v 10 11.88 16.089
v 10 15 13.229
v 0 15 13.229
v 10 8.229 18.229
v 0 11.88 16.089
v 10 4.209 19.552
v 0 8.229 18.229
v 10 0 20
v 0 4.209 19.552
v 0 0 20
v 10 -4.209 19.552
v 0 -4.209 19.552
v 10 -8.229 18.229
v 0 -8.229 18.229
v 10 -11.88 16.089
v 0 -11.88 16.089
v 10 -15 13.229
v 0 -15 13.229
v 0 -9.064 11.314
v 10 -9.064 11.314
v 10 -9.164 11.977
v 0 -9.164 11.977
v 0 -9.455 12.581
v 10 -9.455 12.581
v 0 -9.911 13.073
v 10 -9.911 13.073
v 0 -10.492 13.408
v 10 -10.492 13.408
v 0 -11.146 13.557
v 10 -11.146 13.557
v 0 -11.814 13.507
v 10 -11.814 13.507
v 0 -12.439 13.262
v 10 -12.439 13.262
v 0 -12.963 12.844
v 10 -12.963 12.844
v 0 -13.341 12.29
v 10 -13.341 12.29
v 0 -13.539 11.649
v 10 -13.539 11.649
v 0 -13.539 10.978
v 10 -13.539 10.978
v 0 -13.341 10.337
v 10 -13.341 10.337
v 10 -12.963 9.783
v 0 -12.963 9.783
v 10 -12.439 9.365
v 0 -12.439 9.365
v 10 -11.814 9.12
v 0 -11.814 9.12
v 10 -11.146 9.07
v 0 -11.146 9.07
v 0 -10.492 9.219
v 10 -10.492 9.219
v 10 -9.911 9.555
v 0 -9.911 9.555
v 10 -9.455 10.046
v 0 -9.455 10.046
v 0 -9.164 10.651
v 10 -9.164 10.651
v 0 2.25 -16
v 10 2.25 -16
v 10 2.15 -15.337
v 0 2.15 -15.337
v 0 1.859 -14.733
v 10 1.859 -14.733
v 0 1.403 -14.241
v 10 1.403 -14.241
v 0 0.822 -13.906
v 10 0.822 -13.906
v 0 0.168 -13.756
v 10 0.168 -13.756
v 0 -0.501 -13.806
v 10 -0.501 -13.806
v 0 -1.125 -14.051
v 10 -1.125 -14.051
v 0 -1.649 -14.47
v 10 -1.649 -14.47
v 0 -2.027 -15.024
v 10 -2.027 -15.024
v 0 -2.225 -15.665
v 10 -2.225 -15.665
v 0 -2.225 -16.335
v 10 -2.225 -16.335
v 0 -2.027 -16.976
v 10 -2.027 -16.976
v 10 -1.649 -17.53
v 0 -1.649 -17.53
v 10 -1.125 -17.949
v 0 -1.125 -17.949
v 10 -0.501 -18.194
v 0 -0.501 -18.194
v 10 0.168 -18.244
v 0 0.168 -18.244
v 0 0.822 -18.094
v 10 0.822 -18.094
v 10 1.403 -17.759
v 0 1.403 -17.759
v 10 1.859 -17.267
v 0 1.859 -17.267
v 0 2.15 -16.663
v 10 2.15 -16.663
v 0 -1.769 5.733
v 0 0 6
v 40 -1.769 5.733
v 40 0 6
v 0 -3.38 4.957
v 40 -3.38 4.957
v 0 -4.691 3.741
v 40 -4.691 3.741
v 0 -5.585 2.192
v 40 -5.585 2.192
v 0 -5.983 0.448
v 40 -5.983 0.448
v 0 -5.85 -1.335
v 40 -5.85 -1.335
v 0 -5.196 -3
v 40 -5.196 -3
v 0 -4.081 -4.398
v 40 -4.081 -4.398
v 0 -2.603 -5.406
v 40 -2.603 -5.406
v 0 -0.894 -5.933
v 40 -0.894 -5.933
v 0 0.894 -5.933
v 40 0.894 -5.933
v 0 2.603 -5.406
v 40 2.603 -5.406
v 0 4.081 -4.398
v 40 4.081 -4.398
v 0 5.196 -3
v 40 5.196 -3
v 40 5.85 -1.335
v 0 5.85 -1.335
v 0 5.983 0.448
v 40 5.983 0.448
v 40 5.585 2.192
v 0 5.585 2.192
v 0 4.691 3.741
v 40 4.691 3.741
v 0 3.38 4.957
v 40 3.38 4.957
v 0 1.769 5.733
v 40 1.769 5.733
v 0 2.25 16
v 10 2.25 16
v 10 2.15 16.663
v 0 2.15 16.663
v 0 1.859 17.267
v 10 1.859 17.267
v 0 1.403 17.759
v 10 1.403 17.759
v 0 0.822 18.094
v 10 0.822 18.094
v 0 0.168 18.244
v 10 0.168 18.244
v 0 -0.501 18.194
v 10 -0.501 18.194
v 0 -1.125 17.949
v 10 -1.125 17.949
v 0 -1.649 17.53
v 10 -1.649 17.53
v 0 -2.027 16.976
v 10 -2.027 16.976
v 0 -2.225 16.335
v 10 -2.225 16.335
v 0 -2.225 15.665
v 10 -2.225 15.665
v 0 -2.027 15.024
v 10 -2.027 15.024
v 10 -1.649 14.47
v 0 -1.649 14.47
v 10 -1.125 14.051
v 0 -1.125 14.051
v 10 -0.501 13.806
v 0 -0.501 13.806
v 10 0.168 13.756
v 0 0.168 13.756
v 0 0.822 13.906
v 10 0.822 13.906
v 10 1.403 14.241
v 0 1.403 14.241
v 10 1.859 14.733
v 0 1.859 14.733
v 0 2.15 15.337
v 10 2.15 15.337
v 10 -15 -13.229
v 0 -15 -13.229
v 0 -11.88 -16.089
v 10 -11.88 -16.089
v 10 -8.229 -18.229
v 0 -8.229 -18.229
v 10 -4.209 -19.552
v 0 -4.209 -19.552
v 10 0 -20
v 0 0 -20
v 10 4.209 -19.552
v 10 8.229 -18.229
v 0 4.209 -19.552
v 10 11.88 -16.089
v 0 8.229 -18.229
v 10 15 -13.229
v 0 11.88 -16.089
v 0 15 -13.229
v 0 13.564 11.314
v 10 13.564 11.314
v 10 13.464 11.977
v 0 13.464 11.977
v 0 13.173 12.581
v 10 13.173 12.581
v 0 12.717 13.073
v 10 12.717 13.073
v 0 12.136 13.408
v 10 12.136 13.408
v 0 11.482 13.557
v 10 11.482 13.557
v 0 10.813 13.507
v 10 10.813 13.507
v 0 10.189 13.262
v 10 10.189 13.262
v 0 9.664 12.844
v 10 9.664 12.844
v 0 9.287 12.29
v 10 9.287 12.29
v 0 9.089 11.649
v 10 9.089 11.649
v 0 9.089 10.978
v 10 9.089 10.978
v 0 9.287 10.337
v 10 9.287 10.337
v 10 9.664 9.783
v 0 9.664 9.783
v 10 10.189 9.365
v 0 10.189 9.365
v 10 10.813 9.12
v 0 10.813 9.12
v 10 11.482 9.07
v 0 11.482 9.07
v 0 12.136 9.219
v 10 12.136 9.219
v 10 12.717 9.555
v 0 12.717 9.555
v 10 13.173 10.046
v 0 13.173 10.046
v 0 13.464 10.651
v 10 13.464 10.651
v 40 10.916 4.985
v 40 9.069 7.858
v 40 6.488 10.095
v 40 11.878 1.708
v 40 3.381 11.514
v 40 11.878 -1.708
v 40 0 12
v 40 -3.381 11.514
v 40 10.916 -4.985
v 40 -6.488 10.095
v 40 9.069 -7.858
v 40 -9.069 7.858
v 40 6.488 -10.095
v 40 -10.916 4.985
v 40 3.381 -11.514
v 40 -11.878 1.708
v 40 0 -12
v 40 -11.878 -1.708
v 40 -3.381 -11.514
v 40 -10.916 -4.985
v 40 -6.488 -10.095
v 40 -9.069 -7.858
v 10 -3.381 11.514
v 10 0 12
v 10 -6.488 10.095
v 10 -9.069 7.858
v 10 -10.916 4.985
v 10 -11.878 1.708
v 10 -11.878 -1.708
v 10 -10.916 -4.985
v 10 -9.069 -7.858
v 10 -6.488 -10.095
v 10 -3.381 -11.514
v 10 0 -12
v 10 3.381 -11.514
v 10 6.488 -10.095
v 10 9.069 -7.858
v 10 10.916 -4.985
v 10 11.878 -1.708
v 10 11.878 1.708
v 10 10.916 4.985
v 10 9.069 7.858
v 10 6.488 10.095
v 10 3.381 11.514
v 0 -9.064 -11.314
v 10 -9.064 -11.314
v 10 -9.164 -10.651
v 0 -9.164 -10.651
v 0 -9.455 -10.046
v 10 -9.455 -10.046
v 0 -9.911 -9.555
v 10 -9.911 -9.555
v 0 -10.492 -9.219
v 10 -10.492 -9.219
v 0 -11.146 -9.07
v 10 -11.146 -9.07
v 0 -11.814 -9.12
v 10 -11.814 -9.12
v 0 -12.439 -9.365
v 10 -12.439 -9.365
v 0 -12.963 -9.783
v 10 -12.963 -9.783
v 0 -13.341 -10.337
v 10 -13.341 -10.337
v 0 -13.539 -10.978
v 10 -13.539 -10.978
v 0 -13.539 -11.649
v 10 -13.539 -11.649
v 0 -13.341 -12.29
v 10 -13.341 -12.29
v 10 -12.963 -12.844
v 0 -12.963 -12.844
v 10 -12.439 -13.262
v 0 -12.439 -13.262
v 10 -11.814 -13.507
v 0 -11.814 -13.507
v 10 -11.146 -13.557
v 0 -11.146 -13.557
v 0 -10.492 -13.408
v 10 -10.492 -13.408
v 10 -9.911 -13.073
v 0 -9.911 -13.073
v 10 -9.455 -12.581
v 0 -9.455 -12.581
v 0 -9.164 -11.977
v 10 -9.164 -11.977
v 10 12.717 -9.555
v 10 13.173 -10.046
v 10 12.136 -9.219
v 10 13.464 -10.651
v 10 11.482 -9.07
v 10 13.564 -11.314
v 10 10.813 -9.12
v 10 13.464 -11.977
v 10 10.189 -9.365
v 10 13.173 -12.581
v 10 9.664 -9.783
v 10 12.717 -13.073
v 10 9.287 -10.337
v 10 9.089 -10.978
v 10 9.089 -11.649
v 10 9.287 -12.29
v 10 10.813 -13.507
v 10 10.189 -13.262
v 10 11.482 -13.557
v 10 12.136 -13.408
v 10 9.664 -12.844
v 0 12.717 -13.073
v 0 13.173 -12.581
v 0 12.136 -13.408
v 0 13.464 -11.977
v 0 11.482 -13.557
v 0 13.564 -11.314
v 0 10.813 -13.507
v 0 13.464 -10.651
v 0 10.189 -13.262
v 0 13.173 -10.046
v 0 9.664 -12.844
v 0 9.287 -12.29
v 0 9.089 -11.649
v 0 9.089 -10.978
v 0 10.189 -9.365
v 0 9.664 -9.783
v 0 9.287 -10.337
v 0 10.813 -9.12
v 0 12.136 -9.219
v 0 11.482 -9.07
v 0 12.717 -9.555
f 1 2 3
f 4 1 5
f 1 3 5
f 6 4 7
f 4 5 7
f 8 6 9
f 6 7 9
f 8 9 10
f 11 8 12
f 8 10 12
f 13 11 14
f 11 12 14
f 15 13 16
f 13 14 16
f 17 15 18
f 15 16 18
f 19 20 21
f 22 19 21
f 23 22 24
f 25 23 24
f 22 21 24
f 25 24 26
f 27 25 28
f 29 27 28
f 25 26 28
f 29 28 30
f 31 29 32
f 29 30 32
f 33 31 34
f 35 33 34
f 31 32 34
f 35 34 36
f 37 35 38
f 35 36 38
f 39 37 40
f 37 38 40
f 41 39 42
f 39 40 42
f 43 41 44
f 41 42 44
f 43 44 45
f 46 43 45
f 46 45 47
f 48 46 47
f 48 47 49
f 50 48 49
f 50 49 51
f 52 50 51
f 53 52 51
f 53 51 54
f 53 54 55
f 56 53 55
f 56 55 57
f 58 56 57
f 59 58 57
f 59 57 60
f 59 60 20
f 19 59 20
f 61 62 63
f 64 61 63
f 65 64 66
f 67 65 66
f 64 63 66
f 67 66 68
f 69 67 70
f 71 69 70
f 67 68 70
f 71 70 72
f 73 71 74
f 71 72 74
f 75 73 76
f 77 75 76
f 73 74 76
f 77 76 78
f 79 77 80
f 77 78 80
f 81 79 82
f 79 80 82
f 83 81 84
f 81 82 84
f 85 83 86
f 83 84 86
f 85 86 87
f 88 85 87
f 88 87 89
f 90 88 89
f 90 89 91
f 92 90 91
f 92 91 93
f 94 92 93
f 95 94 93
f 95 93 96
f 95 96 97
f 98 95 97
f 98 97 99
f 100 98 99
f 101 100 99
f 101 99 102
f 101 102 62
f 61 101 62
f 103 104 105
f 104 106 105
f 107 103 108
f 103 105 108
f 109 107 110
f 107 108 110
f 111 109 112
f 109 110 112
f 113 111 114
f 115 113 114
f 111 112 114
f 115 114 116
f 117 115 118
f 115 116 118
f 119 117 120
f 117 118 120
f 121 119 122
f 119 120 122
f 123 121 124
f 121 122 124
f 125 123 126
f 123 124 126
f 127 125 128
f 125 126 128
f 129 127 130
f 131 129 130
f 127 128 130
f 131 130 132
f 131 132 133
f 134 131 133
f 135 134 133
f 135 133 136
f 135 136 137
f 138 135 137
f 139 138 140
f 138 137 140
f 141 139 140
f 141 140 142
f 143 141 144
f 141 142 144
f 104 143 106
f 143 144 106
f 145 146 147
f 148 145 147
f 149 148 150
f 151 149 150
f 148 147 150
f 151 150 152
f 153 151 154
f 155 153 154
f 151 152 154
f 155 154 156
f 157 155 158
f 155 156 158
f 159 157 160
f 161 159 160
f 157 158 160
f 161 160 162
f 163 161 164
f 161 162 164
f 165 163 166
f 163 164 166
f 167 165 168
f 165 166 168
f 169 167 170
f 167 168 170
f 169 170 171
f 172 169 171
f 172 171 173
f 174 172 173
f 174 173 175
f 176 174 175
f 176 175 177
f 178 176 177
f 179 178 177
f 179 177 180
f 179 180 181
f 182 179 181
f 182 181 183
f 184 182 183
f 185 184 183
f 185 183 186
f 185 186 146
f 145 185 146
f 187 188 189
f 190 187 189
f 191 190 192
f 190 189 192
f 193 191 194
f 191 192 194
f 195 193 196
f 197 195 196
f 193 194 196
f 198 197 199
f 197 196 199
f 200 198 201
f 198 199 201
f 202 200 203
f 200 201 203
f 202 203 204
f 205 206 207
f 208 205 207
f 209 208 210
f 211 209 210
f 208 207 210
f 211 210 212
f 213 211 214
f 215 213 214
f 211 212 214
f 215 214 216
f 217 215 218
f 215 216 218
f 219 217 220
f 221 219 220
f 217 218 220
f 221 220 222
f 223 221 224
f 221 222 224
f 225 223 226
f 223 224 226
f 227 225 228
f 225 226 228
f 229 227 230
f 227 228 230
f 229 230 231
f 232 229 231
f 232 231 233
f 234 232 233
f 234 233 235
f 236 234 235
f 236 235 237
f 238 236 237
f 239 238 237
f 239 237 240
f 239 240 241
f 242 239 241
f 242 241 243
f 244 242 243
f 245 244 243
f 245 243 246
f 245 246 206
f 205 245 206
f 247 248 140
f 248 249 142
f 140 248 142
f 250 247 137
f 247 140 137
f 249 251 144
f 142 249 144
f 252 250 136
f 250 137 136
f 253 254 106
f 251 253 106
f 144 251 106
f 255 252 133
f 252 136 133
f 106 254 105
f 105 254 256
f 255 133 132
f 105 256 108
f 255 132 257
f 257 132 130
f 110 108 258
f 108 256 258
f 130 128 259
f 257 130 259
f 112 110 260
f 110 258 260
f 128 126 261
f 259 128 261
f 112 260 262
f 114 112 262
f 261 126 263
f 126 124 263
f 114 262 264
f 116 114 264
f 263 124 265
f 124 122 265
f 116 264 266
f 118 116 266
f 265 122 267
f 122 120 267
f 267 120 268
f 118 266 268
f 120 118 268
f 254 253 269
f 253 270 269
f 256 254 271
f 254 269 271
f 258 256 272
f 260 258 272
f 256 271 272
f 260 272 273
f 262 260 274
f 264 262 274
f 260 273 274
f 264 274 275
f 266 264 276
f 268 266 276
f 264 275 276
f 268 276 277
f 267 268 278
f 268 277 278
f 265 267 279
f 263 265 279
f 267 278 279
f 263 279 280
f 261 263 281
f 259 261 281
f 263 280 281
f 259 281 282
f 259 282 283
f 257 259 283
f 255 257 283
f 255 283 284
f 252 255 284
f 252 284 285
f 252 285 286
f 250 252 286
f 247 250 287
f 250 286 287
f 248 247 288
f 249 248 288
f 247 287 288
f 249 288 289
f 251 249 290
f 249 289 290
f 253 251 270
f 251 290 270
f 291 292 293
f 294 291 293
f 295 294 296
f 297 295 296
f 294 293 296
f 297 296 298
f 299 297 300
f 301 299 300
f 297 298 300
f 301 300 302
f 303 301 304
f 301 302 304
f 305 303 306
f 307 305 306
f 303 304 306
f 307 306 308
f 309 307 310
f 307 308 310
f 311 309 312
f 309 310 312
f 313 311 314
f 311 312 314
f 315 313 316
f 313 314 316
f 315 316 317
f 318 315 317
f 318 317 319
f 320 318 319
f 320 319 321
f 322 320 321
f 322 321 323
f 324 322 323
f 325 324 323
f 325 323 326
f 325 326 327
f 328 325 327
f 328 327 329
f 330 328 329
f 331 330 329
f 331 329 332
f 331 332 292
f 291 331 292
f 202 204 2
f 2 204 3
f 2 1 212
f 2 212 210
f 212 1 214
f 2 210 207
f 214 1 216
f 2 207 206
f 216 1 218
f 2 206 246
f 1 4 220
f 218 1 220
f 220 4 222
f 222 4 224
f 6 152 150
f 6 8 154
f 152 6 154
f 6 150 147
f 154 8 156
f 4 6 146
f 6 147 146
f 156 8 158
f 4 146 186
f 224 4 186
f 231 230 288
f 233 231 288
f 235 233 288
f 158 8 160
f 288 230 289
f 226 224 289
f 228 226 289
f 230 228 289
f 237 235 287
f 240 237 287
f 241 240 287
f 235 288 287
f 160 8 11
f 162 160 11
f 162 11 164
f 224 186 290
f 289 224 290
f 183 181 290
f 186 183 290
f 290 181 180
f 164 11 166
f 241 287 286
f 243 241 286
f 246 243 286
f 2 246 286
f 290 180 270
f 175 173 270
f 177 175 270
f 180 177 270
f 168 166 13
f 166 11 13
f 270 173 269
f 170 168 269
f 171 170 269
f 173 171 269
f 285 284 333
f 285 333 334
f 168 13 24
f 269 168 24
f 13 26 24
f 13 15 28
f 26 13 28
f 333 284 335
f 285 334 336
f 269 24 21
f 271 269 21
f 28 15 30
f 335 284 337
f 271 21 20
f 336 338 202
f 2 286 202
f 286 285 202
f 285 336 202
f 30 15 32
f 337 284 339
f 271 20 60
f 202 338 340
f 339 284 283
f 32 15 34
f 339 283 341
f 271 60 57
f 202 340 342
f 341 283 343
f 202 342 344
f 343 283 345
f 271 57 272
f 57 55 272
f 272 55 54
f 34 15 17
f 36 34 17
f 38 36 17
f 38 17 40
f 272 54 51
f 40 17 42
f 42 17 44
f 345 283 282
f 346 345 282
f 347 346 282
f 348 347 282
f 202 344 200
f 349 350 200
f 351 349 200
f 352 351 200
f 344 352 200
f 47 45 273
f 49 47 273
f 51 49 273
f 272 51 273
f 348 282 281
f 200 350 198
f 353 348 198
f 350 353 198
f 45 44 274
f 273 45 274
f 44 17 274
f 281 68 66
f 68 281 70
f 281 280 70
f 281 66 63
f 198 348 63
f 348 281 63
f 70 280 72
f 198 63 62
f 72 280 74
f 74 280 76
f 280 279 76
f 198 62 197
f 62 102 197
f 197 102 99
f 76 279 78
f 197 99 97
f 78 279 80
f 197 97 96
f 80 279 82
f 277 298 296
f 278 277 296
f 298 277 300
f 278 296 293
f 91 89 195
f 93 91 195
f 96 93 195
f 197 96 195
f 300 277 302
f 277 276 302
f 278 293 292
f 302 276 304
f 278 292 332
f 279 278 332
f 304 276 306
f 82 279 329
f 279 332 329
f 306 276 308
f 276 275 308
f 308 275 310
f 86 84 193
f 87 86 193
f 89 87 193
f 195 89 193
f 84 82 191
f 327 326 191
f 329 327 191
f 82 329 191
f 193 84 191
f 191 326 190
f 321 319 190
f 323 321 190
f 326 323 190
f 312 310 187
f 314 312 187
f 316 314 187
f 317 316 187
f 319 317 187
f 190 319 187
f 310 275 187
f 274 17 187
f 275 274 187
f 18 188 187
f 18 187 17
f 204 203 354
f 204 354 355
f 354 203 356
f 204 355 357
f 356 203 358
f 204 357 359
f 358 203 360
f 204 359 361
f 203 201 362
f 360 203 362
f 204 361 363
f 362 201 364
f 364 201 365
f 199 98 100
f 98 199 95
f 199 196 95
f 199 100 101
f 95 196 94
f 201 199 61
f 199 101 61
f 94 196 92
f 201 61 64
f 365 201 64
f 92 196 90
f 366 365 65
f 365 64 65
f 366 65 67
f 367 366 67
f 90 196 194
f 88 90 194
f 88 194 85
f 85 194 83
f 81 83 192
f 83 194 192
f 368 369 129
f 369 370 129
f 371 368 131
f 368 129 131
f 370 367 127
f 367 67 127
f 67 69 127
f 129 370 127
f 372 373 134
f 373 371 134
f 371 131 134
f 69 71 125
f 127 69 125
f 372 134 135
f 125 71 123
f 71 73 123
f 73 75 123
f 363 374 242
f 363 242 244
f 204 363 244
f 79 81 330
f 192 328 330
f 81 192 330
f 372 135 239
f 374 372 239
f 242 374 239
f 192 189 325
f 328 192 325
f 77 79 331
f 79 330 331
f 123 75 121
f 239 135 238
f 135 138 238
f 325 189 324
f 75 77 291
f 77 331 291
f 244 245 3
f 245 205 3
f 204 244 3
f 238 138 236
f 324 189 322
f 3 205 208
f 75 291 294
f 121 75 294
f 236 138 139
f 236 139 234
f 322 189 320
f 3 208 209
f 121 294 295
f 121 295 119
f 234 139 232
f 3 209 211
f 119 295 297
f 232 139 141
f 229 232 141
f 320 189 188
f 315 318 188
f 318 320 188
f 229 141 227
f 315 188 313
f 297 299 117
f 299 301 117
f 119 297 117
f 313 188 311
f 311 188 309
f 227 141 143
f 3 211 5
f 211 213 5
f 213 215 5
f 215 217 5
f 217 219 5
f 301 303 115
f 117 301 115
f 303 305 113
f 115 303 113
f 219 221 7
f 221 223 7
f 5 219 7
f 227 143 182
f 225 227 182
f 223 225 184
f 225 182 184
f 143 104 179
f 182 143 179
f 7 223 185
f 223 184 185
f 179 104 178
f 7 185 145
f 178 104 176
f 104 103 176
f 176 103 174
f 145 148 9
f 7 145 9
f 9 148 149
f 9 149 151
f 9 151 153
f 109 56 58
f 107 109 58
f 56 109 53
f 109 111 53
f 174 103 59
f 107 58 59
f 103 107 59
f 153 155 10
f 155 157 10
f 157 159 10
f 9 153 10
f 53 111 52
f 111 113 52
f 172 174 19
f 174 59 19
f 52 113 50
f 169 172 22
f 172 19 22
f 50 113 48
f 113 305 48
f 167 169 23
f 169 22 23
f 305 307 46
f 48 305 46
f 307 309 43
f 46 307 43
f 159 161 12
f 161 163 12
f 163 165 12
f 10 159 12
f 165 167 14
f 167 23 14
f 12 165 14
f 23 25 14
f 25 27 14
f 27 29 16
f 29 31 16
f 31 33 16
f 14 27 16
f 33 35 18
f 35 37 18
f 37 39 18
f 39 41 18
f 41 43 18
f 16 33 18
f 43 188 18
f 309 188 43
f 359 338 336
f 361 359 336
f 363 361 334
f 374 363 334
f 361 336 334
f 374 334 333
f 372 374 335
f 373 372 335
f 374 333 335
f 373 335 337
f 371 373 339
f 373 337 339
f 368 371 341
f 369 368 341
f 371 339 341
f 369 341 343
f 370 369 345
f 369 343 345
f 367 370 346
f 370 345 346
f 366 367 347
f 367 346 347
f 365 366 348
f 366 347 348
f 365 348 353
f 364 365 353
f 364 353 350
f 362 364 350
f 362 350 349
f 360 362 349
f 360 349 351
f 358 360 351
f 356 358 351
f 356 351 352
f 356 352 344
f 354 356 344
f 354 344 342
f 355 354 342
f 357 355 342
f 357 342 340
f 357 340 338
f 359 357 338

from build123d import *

# Parameters (mm, degrees)
F2_W     = 10
F2_H     = 40
F3_DEPTH = 40.001
F4_D     = 4.5


with BuildPart() as f1:
    # F0 (on Front) → F1 (revolve)
    with BuildSketch(Plane.XZ):
        Polygon((0, 20), (0, 6), (40, 6), (40, 12), (10, 12), (10, 20), align=None)
    revolve(axis=Axis((24.2165401578, 0, 0), (1, 0, 0)))

    # F2 (on face) → F3 (cut, through all)
    with BuildSketch(Plane(origin=(0, 0, 0), x_dir=(0, -1, 0), z_dir=(-1, 0, 0))):
        with Locations((-20, 0)):
            Rectangle(F2_W, F2_H)
        with Locations((20, 0)):
            Rectangle(F2_W, F2_H)
    extrude(amount=-F3_DEPTH, mode=Mode.SUBTRACT)

    # F4 (through all)
    with Locations(Plane(origin=(0, 0, 0), x_dir=(0, -1, 0), z_dir=(-1, 0, 0))):
        with Locations((-11.313708499, 11.313708499), (11.313708499, 11.313708499), (11.313708499, -11.313708499), (-11.313708499, -11.313708499), (0, 16), (0, -16)):
            Hole(F4_D / 2)


solid = f1.part
